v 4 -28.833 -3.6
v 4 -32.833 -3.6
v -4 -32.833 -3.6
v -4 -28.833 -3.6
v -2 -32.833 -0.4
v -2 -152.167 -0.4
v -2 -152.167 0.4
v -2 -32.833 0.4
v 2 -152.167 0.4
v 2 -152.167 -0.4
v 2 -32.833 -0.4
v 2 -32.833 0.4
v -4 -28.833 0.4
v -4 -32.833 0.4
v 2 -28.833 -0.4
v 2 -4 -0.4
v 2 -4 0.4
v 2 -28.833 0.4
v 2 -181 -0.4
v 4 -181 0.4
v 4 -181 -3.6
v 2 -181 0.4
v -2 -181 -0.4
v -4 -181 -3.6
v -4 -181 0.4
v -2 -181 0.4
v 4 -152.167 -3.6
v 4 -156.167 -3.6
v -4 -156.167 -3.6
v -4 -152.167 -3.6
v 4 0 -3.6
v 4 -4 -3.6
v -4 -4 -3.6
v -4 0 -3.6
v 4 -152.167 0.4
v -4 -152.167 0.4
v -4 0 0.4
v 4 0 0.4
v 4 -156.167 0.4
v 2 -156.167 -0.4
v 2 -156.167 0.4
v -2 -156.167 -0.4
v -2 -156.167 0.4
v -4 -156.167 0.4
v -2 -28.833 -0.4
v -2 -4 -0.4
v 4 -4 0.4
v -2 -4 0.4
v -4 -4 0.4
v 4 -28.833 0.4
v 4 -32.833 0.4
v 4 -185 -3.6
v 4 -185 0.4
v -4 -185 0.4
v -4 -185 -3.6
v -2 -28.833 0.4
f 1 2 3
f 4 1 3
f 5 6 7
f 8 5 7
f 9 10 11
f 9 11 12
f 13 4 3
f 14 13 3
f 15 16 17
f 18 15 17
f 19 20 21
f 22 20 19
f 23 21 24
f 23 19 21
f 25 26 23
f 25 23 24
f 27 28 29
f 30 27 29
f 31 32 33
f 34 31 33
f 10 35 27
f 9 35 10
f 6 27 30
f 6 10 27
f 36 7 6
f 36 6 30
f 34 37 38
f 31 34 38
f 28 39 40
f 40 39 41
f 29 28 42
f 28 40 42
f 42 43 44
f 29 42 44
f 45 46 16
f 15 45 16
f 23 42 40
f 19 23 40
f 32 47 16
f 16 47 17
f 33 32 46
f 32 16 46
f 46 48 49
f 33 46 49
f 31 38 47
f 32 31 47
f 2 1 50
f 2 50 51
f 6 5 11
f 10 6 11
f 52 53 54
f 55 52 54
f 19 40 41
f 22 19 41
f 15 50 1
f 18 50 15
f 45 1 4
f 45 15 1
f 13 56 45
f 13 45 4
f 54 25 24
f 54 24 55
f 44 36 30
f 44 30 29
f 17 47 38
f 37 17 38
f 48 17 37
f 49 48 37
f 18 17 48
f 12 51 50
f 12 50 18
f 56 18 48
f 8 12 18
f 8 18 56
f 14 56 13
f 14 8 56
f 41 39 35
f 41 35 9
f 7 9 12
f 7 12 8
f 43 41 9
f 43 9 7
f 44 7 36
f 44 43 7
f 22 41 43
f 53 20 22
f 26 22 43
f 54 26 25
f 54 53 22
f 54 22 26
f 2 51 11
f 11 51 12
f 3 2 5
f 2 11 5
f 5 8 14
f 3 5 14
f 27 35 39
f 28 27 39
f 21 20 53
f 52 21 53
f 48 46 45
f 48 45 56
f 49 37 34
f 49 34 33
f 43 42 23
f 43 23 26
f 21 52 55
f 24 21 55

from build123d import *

# Parameters (mm, degrees)
SKETCH_W     = 4
SKETCH_H     = 0.8
PAD_DEPTH    = 185
SKETCH002_W  = 8
SKETCH002_H  = 4
PAD001_DEPTH = 4


with BuildPart() as part:
    # Sketch → Pad (new body)
    with BuildSketch(Plane.XZ):
        Rectangle(SKETCH_W, SKETCH_H)
    extrude(amount=PAD_DEPTH)

    # Sketch002 (on Face4 of Pad) → Pad001 (join)
    with BuildSketch(Plane(origin=(0, 0, 0.4), x_dir=(-1, 0, 0), z_dir=(0, 0, 1))):
        with Locations((0, 183)):
            Rectangle(SKETCH002_W, SKETCH002_H)
        with Locations((0, 154.166667)):
            Rectangle(SKETCH002_W, SKETCH002_H)
        with Locations((0, 30.833333)):
            Rectangle(SKETCH002_W, SKETCH002_H)
        with Locations((0, 2)):
            Rectangle(SKETCH002_W, SKETCH002_H)
    extrude(amount=-PAD001_DEPTH)


solid = part.part
